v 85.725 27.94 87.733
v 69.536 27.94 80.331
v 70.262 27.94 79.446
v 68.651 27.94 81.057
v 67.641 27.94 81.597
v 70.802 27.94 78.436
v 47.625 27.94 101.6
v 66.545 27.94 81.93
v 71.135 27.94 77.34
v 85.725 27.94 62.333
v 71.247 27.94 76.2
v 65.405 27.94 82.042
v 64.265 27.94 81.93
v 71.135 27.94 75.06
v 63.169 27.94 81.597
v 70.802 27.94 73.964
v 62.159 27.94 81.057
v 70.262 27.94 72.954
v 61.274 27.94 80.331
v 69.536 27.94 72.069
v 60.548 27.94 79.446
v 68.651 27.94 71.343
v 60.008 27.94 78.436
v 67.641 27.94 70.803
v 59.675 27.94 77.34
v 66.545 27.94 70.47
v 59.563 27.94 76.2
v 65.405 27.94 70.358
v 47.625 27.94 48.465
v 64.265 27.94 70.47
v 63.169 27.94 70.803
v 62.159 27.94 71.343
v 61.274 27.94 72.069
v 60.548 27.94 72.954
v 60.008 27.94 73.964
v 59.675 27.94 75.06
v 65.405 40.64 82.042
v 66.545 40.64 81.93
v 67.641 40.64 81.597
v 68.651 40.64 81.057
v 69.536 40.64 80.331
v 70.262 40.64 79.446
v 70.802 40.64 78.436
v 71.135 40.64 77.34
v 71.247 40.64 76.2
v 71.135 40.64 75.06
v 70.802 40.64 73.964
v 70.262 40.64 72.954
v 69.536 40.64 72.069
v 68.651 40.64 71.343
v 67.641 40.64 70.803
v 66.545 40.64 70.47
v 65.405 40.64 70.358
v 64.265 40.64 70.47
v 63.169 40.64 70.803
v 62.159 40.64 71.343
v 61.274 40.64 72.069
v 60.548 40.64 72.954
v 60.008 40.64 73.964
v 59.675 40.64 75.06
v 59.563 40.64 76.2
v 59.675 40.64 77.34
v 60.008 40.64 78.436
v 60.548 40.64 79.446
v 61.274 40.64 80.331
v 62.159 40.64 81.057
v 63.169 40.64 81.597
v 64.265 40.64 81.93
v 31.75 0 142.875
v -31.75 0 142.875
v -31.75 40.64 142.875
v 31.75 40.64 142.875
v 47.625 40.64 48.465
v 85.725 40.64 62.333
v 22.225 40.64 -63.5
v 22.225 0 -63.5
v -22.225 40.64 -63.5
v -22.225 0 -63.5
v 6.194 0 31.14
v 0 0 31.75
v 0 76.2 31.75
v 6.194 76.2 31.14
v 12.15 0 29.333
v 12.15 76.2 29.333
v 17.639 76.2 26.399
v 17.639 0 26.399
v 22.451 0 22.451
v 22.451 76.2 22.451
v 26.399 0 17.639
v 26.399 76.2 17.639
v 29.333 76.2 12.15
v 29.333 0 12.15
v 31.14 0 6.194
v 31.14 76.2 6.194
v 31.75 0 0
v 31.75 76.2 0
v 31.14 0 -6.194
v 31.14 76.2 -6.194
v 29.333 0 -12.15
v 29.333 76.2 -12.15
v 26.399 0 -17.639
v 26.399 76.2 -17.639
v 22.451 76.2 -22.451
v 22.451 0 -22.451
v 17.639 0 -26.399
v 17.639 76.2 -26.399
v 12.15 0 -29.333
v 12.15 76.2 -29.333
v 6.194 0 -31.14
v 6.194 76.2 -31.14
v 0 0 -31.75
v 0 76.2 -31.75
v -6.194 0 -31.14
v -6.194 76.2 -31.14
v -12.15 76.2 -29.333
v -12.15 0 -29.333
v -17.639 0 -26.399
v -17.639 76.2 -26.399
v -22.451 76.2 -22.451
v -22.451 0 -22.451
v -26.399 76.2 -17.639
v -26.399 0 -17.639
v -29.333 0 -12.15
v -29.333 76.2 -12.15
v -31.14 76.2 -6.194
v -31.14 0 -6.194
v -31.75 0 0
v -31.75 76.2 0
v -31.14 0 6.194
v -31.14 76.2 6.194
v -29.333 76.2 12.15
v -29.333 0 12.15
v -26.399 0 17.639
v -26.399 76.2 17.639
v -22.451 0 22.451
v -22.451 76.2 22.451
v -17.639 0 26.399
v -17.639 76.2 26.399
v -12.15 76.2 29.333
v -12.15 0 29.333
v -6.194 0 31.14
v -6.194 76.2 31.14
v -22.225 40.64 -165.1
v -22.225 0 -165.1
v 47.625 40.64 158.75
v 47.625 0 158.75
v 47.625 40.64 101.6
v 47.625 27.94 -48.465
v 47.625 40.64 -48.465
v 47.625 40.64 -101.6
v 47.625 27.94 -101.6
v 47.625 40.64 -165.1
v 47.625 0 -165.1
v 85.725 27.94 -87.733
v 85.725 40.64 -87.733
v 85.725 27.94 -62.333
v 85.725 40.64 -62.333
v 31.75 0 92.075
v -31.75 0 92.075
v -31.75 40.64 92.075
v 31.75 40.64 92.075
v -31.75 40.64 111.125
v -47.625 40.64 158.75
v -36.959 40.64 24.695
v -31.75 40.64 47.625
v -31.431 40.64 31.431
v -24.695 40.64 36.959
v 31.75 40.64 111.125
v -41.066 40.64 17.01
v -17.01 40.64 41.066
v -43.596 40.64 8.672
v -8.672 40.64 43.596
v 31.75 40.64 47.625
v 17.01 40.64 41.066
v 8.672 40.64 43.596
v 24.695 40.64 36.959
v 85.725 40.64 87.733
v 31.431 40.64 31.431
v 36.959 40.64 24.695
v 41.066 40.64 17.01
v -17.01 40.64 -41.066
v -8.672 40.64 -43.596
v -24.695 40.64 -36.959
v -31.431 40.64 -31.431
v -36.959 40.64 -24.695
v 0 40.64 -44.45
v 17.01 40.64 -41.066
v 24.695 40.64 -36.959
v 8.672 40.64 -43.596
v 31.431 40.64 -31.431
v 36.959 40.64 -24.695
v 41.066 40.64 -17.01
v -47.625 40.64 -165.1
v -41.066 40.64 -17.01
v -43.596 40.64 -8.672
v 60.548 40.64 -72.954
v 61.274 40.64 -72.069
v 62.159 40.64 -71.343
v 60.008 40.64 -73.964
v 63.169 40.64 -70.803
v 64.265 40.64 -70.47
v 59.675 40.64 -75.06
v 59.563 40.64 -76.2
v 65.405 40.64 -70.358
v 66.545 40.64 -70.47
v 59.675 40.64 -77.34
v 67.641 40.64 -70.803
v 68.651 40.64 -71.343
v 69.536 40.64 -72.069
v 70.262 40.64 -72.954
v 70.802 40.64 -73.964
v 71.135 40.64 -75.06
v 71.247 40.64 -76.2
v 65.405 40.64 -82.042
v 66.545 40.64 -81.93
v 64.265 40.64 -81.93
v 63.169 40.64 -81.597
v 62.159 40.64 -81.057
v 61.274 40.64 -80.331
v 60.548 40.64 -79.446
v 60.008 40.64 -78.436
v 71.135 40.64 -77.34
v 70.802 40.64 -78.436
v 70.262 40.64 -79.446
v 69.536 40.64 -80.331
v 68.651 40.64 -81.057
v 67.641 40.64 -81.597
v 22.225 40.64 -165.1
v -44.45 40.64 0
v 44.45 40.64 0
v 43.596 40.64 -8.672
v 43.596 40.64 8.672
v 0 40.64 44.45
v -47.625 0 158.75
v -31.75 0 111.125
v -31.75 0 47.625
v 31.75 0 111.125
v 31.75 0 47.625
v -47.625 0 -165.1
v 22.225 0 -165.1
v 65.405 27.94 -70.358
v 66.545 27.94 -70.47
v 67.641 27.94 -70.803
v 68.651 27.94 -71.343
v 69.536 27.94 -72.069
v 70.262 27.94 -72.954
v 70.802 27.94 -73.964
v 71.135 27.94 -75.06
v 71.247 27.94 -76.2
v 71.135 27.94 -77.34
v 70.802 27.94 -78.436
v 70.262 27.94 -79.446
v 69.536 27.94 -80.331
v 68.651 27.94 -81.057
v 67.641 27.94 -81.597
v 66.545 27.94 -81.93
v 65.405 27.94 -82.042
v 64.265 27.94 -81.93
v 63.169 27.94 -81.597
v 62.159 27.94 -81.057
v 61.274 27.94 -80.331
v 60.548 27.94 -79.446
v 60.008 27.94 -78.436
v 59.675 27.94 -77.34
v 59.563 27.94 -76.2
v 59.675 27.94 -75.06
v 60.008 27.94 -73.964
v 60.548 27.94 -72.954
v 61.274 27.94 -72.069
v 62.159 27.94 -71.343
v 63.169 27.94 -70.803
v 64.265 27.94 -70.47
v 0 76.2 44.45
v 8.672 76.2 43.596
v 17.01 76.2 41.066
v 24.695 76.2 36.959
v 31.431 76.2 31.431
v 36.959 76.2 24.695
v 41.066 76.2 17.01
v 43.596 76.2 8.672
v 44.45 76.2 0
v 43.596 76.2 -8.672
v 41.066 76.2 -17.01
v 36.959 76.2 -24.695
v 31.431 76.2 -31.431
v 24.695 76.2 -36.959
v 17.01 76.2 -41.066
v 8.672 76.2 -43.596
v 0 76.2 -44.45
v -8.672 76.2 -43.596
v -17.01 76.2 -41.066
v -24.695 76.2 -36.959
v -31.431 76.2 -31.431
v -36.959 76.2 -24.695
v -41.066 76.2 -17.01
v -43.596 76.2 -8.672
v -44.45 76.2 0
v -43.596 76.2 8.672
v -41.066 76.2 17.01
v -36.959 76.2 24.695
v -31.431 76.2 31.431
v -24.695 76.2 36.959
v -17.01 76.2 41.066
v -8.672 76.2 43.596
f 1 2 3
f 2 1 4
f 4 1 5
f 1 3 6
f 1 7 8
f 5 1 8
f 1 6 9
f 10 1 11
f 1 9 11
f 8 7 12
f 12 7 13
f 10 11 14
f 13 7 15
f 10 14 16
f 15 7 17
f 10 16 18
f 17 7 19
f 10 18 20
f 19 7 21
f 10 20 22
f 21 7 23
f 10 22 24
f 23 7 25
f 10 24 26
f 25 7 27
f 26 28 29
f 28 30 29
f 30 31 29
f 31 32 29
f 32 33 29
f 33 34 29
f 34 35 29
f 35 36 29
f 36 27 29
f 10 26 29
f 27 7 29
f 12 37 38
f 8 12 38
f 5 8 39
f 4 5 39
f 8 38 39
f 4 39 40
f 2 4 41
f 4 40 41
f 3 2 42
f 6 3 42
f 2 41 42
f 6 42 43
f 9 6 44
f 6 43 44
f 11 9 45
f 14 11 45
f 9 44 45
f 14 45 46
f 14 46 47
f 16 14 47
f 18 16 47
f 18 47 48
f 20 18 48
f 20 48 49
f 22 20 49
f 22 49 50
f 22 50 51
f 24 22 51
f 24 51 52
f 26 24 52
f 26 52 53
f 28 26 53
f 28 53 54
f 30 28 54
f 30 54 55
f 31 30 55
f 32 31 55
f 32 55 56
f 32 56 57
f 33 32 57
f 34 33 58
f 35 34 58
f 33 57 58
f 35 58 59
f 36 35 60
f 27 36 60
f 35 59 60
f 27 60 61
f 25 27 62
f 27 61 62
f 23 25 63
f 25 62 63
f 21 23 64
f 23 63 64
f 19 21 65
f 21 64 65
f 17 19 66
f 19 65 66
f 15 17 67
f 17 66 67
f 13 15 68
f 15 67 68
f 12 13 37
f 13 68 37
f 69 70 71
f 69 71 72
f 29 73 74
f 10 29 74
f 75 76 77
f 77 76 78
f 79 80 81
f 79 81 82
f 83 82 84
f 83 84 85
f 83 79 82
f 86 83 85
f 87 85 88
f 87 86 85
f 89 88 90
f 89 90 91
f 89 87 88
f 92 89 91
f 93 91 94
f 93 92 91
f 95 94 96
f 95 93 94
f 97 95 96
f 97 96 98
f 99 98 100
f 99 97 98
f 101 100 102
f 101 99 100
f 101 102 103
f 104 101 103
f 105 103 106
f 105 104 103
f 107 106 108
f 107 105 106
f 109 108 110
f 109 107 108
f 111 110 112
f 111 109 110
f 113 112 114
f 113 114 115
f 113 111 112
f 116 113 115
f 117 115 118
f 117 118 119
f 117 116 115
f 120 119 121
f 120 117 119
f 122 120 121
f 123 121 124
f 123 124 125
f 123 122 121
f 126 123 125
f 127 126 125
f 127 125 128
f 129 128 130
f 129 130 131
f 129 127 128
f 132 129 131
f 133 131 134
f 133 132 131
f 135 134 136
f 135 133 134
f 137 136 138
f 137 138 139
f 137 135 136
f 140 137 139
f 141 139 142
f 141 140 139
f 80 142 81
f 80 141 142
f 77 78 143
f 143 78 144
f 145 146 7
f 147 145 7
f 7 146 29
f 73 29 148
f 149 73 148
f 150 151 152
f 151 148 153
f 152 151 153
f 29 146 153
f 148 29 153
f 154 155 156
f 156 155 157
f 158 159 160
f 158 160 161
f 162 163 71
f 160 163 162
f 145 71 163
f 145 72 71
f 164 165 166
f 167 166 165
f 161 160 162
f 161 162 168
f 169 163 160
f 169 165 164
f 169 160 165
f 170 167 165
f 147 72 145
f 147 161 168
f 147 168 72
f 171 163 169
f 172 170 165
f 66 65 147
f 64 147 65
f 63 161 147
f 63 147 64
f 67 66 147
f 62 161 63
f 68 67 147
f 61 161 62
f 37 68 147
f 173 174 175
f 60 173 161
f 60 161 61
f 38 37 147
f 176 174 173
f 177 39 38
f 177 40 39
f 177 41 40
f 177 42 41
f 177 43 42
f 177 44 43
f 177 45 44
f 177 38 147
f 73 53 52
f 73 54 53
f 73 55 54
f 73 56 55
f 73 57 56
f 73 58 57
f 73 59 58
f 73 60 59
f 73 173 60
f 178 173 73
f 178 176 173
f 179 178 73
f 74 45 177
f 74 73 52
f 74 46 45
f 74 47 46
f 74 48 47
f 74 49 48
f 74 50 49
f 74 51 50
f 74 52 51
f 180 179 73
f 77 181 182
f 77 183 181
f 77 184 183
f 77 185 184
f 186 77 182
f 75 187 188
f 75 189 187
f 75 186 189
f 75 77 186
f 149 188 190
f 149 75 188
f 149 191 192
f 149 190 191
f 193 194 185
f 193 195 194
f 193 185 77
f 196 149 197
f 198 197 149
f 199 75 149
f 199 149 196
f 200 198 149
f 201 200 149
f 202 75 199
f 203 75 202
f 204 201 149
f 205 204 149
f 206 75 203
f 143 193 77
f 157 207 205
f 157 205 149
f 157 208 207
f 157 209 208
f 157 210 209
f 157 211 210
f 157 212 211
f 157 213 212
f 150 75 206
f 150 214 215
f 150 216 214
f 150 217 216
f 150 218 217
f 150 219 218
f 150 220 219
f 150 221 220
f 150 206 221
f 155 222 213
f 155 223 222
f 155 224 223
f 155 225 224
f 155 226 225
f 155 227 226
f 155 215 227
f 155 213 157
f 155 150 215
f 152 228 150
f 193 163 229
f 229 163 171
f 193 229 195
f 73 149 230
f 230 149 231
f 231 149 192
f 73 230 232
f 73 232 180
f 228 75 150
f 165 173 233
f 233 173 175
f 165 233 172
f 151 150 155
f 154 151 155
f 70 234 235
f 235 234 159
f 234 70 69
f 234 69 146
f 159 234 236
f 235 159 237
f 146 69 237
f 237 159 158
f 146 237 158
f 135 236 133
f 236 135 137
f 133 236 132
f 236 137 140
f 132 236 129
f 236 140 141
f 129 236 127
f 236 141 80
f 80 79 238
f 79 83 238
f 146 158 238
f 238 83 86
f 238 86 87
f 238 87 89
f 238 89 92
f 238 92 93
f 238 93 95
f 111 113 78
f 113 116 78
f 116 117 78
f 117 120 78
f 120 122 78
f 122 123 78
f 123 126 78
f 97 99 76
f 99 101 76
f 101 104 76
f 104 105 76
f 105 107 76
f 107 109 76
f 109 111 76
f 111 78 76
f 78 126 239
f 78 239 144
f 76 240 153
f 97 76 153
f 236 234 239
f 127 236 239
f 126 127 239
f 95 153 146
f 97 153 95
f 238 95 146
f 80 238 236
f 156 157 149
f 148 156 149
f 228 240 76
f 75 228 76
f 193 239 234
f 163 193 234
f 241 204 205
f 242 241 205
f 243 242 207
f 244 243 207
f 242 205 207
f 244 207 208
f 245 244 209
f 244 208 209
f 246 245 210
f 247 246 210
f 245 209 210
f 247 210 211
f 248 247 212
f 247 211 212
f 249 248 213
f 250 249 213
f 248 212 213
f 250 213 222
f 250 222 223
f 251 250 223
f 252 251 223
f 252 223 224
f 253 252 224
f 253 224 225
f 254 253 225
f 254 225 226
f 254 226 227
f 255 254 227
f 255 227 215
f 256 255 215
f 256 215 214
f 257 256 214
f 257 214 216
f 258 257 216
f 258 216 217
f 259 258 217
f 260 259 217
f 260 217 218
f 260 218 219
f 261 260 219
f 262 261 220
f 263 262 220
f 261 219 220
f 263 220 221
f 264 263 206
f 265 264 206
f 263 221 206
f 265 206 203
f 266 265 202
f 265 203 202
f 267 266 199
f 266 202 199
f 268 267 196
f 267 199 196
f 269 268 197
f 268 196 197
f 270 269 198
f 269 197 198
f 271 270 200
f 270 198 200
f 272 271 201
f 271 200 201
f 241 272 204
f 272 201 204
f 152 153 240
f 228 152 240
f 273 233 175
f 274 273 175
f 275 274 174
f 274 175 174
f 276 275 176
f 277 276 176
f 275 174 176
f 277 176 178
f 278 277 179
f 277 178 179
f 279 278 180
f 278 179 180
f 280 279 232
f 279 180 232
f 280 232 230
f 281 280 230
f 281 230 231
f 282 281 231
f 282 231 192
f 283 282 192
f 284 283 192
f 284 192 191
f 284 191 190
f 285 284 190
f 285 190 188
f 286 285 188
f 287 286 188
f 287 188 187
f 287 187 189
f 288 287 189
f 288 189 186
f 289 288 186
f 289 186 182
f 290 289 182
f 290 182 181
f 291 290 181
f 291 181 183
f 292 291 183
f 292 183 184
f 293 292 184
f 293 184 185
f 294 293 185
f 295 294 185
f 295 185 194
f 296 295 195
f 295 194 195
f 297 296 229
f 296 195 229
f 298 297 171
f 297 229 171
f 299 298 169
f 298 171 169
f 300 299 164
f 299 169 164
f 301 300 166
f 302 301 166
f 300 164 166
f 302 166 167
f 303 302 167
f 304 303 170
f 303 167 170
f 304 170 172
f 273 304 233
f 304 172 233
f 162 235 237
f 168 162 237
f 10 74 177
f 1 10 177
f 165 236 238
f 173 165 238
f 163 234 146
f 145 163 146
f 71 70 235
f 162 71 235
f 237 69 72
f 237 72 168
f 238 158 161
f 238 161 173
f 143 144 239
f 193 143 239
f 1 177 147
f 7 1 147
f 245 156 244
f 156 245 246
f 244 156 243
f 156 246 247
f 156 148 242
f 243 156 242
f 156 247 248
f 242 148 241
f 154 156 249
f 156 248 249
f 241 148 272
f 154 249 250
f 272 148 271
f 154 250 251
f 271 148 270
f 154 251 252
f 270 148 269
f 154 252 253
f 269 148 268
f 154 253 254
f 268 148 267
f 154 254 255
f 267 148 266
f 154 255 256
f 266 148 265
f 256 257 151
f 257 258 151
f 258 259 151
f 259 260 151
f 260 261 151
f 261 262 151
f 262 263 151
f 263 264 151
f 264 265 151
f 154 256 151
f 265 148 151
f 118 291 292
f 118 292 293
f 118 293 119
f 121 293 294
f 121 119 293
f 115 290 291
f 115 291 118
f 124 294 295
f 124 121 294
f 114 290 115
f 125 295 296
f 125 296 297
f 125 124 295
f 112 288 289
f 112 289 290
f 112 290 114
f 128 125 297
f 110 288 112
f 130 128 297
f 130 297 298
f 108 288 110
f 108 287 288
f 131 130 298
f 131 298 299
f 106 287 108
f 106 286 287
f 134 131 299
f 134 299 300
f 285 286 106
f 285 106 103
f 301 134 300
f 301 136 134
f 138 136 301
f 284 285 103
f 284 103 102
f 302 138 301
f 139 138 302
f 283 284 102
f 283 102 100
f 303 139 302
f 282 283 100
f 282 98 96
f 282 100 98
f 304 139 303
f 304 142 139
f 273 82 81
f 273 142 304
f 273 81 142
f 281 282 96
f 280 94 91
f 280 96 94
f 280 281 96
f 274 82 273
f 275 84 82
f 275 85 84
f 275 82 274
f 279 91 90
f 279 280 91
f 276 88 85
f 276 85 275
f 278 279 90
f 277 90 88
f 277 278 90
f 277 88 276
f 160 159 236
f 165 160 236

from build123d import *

# Parameters (mm, degrees)
SKETCH1_W           = 63.5
SKETCH1_H           = 31.75
SKETCH1_H_2         = 44.45
SKETCH1_R           = 44.45
BOSS_EXTRUDE1_DEPTH = 40.64
SKETCH1_3_R         = 44.45
SKETCH1_3_R_2       = 31.75
BOSS_EXTRUDE2_DEPTH = 76.2
SKETCH2_W           = 203.2
SKETCH2_H           = 12.7
BOSS_EXTRUDE3_DEPTH = 50.8
SKETCH3_R           = 5.842
CUT_EXTRUDE1_DEPTH  = 197.461447172


with BuildPart() as part:
    # Sketch1 → Boss-Extrude1 (new body)
    with BuildSketch(Plane(origin=(0, 0, 0), x_dir=(1, 0, 0), z_dir=(0, 1, 0))):
        Polygon((-47.625, 63.5), (-47.625, -95.25), (-47.625, -158.75), (47.625, -158.75), (47.625, -95.25), (47.625, 63.5), (47.625, 165.1), (22.225, 165.1), (22.225, 63.5), (-22.225, 63.5), (-22.225, 165.1), (-47.625, 165.1), align=None)
        with Locations((0, -127)):
            Rectangle(SKETCH1_W, SKETCH1_H, mode=Mode.SUBTRACT)
        with Locations((0, -69.85)):
            Rectangle(SKETCH1_W, SKETCH1_H_2, mode=Mode.SUBTRACT)
        Circle(SKETCH1_R, mode=Mode.SUBTRACT)
    extrude(amount=BOSS_EXTRUDE1_DEPTH)

    # Sketch1<3> → Boss-Extrude2 (add)
    with BuildSketch(Plane(origin=(0, 0, 0), x_dir=(1, 0, 0), z_dir=(0, 1, 0))):
        Circle(SKETCH1_3_R)
        Circle(SKETCH1_3_R_2, mode=Mode.SUBTRACT)
    extrude(amount=BOSS_EXTRUDE2_DEPTH)

    # Sketch2 → Boss-Extrude3 (add)
    with BuildSketch(Plane(origin=(47.625, 0, 0), x_dir=(0, 0, -1), z_dir=(1, 0, 0))):
        with Locations((0, 34.29)):
            Rectangle(SKETCH2_W, SKETCH2_H)
    extrude(amount=BOSS_EXTRUDE3_DEPTH)

    # Sketch3 → Cut-Extrude1 (cut, through all)
    with BuildSketch(Plane(origin=(0, 40.64, 0), x_dir=(1, 0, 0), z_dir=(0, 1, 0))):
        with Locations((65.405, 76.2)):
            Circle(SKETCH3_R)
        with Locations((65.405, -76.2)):
            Circle(SKETCH3_R)
        Polygon((47.625, 101.6), (85.725, 87.732734074), (85.725, 62.332734074), (47.625, 48.465468149), (47.625, -48.465468149), (85.725, -62.332734074), (85.725, -87.732734074), (47.625, -101.6), (98.425, -101.6), (98.425, 101.6), align=None)
    extrude(amount=-CUT_EXTRUDE1_DEPTH, mode=Mode.SUBTRACT)


solid = part.part
